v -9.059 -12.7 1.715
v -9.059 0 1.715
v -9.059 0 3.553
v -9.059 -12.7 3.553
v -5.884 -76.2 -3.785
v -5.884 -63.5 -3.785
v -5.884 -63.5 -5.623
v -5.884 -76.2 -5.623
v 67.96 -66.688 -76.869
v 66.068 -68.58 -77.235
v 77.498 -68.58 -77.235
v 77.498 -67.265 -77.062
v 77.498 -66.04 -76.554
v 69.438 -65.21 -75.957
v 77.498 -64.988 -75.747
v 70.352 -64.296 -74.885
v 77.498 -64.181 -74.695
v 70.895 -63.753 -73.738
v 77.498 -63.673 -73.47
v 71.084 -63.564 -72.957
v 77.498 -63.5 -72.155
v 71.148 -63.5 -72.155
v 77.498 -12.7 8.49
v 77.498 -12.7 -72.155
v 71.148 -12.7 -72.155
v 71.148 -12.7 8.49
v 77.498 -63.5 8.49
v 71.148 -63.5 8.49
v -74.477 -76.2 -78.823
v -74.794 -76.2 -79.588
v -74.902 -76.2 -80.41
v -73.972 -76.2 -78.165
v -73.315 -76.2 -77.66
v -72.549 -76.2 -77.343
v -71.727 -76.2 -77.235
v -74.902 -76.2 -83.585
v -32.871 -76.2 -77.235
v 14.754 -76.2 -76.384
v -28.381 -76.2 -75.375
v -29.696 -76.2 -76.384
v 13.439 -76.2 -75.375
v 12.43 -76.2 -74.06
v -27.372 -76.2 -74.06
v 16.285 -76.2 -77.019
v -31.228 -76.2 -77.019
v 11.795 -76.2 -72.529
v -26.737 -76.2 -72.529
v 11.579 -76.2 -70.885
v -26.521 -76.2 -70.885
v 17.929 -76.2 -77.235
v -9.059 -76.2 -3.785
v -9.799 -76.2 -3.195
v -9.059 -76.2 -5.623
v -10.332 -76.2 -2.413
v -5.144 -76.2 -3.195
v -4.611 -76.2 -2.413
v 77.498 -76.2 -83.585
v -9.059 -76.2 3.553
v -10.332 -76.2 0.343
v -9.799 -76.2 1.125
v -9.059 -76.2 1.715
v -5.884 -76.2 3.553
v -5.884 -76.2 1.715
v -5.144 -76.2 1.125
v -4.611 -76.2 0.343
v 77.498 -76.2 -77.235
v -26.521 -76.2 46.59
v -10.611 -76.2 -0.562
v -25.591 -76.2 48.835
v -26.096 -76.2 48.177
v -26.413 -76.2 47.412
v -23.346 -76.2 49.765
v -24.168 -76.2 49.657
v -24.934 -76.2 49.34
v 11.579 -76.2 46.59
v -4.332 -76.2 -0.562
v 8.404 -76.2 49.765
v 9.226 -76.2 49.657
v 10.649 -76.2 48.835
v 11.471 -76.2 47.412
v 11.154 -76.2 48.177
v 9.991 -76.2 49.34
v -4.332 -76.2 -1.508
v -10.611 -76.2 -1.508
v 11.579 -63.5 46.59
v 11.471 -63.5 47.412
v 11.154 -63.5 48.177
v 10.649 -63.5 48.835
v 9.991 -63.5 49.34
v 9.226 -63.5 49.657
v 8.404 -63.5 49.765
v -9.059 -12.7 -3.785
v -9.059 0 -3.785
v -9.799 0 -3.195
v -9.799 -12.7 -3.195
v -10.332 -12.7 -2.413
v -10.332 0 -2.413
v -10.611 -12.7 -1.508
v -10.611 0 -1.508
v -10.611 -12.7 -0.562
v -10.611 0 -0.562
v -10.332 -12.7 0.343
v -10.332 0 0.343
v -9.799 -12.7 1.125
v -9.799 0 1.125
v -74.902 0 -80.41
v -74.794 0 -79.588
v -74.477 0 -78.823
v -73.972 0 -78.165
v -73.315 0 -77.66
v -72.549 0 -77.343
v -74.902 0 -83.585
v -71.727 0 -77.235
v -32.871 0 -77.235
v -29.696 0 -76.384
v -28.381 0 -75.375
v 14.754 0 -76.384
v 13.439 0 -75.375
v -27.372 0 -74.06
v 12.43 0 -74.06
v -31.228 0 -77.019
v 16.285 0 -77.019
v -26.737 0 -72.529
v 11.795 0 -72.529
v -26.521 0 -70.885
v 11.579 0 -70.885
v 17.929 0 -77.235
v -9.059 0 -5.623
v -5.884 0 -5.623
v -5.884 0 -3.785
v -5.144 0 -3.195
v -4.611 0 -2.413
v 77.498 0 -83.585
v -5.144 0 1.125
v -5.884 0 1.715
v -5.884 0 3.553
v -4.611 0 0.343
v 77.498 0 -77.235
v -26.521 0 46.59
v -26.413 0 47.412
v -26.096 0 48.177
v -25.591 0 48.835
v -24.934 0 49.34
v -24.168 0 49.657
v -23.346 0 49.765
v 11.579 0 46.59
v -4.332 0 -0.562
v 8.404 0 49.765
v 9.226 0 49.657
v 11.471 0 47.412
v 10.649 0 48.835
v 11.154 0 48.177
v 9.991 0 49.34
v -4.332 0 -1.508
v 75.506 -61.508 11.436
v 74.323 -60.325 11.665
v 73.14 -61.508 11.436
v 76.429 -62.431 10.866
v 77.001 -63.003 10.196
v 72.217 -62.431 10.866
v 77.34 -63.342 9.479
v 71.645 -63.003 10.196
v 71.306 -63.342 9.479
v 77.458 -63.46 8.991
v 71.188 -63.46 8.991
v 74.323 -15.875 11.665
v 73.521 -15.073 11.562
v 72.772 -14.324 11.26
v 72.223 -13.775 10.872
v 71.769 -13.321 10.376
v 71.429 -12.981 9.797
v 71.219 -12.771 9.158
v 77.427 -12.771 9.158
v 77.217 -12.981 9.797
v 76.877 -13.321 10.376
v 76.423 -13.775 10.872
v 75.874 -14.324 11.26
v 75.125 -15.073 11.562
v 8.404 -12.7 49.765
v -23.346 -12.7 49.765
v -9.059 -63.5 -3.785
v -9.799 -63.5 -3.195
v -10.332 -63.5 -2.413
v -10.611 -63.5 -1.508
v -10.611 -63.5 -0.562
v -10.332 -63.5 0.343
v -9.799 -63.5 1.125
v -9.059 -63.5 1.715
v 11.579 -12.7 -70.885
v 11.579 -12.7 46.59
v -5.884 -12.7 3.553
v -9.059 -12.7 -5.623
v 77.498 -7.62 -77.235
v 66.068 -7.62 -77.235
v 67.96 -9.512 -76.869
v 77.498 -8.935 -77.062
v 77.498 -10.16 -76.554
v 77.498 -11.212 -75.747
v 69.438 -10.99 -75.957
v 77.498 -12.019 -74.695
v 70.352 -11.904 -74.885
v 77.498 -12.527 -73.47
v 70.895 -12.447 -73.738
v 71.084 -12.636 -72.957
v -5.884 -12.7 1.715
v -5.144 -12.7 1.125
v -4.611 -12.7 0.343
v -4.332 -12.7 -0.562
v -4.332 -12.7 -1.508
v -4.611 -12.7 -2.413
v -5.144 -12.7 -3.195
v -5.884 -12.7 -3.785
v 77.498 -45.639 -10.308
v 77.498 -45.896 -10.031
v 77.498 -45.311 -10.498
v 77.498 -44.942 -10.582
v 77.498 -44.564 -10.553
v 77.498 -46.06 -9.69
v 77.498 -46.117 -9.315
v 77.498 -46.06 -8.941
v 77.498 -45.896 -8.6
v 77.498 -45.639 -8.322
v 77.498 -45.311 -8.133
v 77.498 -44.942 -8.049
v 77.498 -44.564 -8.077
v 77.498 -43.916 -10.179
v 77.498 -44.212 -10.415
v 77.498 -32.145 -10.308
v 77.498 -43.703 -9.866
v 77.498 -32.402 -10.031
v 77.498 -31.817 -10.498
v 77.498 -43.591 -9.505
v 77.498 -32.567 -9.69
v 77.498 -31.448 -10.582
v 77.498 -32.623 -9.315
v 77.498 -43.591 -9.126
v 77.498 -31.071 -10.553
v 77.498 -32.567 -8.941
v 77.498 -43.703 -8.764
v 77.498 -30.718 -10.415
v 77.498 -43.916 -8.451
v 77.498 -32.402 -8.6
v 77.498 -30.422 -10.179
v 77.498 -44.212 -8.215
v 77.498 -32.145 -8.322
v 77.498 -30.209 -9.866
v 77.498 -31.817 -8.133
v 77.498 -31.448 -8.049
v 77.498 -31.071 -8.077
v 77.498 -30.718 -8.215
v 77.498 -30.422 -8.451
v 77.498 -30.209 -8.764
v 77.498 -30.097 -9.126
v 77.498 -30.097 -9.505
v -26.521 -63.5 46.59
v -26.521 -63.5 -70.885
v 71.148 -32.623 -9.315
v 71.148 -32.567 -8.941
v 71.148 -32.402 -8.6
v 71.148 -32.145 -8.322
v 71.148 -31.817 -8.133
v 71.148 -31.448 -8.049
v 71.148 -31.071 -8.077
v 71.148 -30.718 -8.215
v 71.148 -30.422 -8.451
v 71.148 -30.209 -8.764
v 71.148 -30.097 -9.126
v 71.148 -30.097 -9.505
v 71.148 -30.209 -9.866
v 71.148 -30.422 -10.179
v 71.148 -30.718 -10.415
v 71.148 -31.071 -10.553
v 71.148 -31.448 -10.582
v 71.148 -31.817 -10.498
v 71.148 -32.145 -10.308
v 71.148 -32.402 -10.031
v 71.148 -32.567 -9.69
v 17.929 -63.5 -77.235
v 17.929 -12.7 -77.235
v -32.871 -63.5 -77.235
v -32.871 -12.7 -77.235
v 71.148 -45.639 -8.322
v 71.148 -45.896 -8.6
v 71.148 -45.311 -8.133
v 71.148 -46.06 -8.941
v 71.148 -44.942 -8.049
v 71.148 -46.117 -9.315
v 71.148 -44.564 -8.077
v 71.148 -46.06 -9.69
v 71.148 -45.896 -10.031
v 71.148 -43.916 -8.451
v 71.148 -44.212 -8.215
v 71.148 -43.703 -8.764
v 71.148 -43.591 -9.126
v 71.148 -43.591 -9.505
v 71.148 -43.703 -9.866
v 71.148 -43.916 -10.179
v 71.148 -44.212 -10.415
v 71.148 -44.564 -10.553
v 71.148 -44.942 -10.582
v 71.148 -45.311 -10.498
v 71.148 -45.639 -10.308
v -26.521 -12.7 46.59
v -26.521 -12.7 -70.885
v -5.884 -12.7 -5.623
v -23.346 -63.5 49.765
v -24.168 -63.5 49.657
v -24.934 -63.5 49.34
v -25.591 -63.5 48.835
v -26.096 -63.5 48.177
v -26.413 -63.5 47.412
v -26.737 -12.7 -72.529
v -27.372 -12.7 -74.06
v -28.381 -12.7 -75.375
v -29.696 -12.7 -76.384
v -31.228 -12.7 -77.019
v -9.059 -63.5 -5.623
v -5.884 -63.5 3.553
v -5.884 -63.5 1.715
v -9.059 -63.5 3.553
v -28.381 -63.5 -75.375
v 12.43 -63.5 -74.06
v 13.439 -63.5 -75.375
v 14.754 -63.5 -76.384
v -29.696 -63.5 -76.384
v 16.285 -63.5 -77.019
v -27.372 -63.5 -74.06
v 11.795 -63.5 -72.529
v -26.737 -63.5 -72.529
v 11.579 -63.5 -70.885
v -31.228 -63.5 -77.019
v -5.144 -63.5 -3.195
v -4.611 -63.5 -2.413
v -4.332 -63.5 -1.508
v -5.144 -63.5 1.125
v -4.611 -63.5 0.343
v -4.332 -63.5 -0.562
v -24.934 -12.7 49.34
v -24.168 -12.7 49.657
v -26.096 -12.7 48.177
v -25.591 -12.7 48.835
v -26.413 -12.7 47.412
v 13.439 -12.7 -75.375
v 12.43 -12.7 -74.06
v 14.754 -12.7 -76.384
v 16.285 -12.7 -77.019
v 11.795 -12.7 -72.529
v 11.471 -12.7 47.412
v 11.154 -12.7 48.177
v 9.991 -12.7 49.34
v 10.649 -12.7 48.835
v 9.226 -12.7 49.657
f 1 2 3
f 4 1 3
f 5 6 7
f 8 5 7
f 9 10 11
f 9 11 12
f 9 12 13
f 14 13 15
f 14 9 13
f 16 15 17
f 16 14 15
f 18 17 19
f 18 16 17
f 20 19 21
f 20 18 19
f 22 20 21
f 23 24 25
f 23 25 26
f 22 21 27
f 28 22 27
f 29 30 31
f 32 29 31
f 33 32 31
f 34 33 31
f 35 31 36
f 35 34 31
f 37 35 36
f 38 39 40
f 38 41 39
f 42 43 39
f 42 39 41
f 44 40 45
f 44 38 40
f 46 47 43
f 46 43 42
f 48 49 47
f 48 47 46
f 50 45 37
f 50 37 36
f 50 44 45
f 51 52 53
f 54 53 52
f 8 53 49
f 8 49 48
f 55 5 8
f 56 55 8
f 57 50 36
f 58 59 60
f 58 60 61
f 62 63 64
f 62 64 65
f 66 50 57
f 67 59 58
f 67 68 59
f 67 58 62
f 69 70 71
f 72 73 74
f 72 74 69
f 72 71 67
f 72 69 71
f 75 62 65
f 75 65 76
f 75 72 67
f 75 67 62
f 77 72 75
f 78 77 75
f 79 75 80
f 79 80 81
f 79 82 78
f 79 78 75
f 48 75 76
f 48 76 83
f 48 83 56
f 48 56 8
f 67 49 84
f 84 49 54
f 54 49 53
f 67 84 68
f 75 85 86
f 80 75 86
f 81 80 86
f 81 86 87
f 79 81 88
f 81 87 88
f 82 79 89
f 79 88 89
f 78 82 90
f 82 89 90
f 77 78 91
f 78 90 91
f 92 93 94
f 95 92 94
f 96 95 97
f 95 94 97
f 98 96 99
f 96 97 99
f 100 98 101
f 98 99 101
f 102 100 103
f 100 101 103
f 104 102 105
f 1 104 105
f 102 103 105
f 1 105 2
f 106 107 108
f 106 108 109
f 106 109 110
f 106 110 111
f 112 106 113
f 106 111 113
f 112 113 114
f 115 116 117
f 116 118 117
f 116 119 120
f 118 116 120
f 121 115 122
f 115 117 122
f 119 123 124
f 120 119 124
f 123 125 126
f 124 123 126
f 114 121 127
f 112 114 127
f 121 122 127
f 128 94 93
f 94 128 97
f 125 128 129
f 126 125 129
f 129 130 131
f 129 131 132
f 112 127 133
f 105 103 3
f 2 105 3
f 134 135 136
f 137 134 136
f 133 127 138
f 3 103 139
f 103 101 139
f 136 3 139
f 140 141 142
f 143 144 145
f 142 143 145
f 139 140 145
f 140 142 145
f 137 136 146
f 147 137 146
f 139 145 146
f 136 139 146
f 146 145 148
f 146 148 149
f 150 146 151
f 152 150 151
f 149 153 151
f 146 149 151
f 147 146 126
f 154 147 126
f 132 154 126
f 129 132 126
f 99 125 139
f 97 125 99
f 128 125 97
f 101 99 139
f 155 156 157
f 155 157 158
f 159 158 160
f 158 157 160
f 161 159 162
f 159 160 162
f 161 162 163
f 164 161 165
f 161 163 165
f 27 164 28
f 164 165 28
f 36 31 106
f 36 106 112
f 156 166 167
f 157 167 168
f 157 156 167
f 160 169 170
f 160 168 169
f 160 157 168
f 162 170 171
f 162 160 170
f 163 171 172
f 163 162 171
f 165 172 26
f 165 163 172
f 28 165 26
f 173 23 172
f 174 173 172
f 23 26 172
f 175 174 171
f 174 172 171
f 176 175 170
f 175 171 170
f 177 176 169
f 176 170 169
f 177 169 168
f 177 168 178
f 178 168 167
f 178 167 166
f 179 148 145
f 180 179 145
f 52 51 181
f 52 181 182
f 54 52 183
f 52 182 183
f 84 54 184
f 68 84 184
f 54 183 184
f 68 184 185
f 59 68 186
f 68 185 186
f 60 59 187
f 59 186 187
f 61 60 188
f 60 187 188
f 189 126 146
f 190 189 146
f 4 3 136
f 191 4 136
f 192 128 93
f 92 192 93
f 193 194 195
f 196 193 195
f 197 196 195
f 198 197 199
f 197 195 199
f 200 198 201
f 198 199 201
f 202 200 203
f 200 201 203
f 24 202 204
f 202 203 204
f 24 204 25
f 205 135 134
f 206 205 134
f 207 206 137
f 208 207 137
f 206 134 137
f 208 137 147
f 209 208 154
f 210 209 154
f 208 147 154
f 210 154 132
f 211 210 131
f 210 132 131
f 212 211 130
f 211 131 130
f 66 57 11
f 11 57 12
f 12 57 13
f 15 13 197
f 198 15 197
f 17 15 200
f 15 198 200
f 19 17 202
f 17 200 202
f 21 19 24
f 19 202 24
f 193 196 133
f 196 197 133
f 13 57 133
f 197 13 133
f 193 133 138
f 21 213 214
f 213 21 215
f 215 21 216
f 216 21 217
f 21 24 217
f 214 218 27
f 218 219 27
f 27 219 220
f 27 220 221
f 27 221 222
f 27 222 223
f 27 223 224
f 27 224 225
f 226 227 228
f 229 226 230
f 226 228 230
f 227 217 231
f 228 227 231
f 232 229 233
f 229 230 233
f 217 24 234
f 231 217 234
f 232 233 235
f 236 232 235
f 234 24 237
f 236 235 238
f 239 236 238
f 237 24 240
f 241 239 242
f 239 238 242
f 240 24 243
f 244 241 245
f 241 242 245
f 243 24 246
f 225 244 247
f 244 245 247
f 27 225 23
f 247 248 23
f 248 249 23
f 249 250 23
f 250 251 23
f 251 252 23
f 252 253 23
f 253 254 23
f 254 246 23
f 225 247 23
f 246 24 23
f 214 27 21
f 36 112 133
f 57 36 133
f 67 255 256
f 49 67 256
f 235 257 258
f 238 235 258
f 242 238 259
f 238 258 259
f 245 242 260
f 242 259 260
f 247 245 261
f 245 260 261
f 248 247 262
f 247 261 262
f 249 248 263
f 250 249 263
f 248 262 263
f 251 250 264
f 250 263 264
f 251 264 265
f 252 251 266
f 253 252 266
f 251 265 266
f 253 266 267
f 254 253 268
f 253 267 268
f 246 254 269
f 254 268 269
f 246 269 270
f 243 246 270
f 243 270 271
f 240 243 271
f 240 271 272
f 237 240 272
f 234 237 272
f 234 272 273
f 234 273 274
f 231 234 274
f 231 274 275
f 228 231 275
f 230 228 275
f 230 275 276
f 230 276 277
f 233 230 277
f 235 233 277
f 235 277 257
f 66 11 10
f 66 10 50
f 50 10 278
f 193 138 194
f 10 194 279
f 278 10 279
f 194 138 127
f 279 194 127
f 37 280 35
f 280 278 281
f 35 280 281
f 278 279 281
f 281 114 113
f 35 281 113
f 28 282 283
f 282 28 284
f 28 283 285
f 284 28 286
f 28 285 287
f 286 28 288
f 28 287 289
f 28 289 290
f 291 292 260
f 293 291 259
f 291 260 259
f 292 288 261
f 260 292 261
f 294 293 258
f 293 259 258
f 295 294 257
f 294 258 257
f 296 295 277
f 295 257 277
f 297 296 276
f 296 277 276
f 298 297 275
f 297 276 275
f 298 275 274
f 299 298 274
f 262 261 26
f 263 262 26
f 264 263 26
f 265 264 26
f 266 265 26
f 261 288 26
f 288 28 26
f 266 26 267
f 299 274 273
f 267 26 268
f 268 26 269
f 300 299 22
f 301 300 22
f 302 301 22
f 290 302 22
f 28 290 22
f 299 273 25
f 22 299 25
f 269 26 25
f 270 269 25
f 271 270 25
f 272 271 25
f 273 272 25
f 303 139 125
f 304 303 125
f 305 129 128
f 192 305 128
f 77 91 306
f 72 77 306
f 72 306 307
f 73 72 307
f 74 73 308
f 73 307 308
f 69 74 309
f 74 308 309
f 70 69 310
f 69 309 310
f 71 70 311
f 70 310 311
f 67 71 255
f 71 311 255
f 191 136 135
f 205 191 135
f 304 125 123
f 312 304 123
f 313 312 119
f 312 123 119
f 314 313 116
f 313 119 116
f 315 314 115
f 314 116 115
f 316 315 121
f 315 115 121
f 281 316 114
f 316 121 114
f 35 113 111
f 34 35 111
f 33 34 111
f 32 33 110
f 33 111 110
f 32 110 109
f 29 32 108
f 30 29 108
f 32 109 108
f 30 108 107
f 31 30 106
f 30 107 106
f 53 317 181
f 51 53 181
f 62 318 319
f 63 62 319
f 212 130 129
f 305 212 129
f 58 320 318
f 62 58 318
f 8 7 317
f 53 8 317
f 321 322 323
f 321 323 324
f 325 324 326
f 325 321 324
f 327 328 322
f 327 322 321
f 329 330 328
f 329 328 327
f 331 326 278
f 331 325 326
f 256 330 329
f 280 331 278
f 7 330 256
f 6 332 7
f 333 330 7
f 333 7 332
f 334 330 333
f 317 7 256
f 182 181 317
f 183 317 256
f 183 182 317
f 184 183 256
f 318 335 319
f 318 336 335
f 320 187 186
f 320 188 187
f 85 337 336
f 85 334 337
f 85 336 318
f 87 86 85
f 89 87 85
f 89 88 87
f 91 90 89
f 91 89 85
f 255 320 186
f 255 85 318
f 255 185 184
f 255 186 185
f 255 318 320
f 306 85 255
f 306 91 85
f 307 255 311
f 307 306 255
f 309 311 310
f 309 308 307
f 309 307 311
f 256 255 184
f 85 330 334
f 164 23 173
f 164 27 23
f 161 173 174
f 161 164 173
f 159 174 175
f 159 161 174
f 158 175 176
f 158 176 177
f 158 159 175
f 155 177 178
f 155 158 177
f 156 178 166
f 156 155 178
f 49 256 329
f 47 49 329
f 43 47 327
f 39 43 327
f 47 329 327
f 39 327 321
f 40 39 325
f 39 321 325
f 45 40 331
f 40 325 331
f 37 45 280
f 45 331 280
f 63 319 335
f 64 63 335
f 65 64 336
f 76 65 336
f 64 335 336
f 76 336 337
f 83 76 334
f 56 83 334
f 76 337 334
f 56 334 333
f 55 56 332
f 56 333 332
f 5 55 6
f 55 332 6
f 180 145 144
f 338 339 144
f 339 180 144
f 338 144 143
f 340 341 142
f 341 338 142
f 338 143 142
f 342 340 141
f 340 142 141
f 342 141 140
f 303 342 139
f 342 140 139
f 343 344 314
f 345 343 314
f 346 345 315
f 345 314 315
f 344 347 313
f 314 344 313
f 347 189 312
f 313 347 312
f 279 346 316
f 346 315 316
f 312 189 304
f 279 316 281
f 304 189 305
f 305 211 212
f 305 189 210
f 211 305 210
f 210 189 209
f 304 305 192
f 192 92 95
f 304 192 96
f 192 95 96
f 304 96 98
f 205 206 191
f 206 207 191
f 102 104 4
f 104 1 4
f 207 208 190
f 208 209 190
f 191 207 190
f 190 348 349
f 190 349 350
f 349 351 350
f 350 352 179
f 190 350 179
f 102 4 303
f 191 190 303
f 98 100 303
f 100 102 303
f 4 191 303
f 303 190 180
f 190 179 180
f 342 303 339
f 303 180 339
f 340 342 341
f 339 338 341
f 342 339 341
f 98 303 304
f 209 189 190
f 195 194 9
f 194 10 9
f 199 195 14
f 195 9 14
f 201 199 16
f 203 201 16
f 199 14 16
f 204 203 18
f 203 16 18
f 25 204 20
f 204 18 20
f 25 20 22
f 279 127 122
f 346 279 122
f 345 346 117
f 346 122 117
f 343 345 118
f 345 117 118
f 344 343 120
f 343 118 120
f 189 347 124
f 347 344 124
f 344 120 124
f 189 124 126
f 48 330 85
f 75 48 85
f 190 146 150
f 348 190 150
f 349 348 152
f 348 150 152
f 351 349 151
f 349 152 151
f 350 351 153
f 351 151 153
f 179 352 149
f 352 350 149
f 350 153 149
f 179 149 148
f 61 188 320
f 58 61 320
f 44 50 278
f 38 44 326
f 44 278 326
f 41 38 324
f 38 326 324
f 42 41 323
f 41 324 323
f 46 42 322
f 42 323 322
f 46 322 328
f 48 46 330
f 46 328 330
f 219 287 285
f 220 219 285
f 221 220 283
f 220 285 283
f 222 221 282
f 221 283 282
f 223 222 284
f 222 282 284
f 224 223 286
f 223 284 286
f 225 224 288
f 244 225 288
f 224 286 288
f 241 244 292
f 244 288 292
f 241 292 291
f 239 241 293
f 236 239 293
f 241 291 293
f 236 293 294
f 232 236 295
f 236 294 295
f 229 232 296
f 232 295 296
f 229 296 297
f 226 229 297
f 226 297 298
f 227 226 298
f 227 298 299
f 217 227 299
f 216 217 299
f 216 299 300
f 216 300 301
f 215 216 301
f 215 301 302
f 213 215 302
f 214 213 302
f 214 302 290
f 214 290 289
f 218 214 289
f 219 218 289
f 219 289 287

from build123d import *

# Parameters (mm, degrees)
F1_DEPTH = 76.2
F4_DEPTH = 50.8
F7_D     = 2.54
F6_W     = 12.7
F6_H     = 88.9
F8_DEPTH = 6.35
F9_R     = 5.08
F10_R    = 3.17499


# Not quite as in the source:
# - a fillet or chamfer is up to 0.001 mm smaller than in the source, because OpenCascade refuses the exact size


with BuildPart() as f1:
    # F0 (on Front) → F1 (new body)
    with BuildSketch(Plane.XZ):
        with BuildLine():
            Line((-74.9020473927, -80.410034281), (-74.9020473927, -83.585034281))
            Line((-74.9020473927, -83.585034281), (77.4979526073, -83.585034281))
            Line((77.4979526073, -83.585034281), (77.4979526073, -77.235034281))
            Line((77.4979526073, -77.235034281), (77.4979526073, 11.664965719))
            Line((77.4979526073, 11.664965719), (71.1479526073, 11.664965719))
            Line((71.1479526073, 11.664965719), (71.1479526073, -77.235034281))
            Line((71.1479526073, -77.235034281), (17.9289044716, -77.235034281))
            ThreePointArc((17.9289044716, -77.235034281), (13.4387764111, -75.3751623415), (11.5789044716, -70.885034281))
            Line((11.5789044716, -70.885034281), (11.5789044716, 46.589965719))
            ThreePointArc((11.5789044716, 46.589965719), (10.6489685019, 48.8350297493), (8.4039044716, 49.764965719))
            Line((8.4039044716, 49.764965719), (-23.3460955284, 49.764965719))
            ThreePointArc((-23.3460955284, 49.764965719), (-25.5911595586, 48.8350297493), (-26.5210955284, 46.589965719))
            Line((-26.5210955284, 46.589965719), (-26.5210955284, -70.885034281))
            ThreePointArc((-26.5210955284, -70.885034281), (-28.3809674678, -75.3751623415), (-32.8710955284, -77.235034281))
            Line((-32.8710955284, -77.235034281), (-71.7270473927, -77.235034281))
            ThreePointArc((-71.7270473927, -77.235034281), (-73.972111423, -78.1649702507), (-74.9020473927, -80.410034281))
        make_face()
        with BuildLine():
            ThreePointArc((-9.0585955284, -3.784664938), (-10.6460955284, -1.035034281), (-9.0585955284, 1.714596376))
            Line((-9.0585955284, 1.714596376), (-9.0585955284, 3.553124576))
            Line((-9.0585955284, 3.553124576), (-5.8835955284, 3.553124576))
            Line((-5.8835955284, 3.553124576), (-5.8835955284, 1.714596376))
            ThreePointArc((-5.8835955284, 1.714596376), (-4.2960955284, -1.035034281), (-5.8835955284, -3.784664938))
            Line((-5.8835955284, -3.784664938), (-5.8835955284, -5.623193138))
            Line((-5.8835955284, -5.623193138), (-9.0585955284, -5.623193138))
            Line((-9.0585955284, -5.623193138), (-9.0585955284, -3.784664938))
        make_face(mode=Mode.SUBTRACT)
    extrude(amount=F1_DEPTH)

    # F3 (on offset) → F4 (cut, through all)
    with BuildSketch(Plane(origin=(0, -12.7, 0), x_dir=(-1, 0, 0), z_dir=(0, 1, 0))):
        with BuildLine():
            Line((-17.9289044716, -77.235034281), (32.8710955284, -77.235034281))
            ThreePointArc((32.8710955284, -77.235034281), (28.3809674678, -75.3751623415), (26.5210955284, -70.885034281))
            Line((26.5210955284, -70.885034281), (26.5210955284, 46.589965719))
            ThreePointArc((26.5210955284, 46.589965719), (25.5911595586, 48.8350297493), (23.3460955284, 49.764965719))
            Line((23.3460955284, 49.764965719), (-8.4039044716, 49.764965719))
            ThreePointArc((-8.4039044716, 49.764965719), (-10.6489685019, 48.8350297493), (-11.5789044716, 46.589965719))
            Line((-11.5789044716, 46.589965719), (-11.5789044716, -70.885034281))
            ThreePointArc((-11.5789044716, -70.885034281), (-13.4387764111, -75.3751623415), (-17.9289044716, -77.235034281))
        make_face()
    extrude(amount=-F4_DEPTH, mode=Mode.SUBTRACT)

    # F7 (through all)
    with Locations(Plane.YZ.offset(77.4979526073)):
        with Locations((-44.846875, -9.3153121099), (-31.353125, -9.3153121099)):
            Hole(F7_D / 2)

    # F6 (on offset) → F8 (cut)
    with BuildSketch(Plane.YZ.offset(77.4979526073)):
        with Locations((-69.85, -32.785034281)):
            Rectangle(F6_W, F6_H)
        with Locations((-6.35, -32.785034281)):
            Rectangle(F6_W, F6_H)
    extrude(amount=-F8_DEPTH, mode=Mode.SUBTRACT)

    # F9
    f9_edges = [f1.edges().sort_by_distance(p)[0] for p in [
        (74.322953, -12.7, -77.235034),
        (71.147953, -38.1, -77.235034),
        (74.322953, -63.5, -77.235034),
    ]]
    fillet(f9_edges, radius=F9_R)

    # F10 (radius 3.175 in the source; OpenCascade refuses exactly that, so slightly less here)
    f10_edges = [f1.edges().sort_by_distance(p)[0] for p in [
        (74.322953, -63.5, 11.664966),
        (74.322953, -12.7, 11.664966),
        (77.497953, -38.1, 11.664966),
        (71.147953, -38.1, 11.664966),
    ]]
    fillet(f10_edges, radius=F10_R)


solid = f1.part
